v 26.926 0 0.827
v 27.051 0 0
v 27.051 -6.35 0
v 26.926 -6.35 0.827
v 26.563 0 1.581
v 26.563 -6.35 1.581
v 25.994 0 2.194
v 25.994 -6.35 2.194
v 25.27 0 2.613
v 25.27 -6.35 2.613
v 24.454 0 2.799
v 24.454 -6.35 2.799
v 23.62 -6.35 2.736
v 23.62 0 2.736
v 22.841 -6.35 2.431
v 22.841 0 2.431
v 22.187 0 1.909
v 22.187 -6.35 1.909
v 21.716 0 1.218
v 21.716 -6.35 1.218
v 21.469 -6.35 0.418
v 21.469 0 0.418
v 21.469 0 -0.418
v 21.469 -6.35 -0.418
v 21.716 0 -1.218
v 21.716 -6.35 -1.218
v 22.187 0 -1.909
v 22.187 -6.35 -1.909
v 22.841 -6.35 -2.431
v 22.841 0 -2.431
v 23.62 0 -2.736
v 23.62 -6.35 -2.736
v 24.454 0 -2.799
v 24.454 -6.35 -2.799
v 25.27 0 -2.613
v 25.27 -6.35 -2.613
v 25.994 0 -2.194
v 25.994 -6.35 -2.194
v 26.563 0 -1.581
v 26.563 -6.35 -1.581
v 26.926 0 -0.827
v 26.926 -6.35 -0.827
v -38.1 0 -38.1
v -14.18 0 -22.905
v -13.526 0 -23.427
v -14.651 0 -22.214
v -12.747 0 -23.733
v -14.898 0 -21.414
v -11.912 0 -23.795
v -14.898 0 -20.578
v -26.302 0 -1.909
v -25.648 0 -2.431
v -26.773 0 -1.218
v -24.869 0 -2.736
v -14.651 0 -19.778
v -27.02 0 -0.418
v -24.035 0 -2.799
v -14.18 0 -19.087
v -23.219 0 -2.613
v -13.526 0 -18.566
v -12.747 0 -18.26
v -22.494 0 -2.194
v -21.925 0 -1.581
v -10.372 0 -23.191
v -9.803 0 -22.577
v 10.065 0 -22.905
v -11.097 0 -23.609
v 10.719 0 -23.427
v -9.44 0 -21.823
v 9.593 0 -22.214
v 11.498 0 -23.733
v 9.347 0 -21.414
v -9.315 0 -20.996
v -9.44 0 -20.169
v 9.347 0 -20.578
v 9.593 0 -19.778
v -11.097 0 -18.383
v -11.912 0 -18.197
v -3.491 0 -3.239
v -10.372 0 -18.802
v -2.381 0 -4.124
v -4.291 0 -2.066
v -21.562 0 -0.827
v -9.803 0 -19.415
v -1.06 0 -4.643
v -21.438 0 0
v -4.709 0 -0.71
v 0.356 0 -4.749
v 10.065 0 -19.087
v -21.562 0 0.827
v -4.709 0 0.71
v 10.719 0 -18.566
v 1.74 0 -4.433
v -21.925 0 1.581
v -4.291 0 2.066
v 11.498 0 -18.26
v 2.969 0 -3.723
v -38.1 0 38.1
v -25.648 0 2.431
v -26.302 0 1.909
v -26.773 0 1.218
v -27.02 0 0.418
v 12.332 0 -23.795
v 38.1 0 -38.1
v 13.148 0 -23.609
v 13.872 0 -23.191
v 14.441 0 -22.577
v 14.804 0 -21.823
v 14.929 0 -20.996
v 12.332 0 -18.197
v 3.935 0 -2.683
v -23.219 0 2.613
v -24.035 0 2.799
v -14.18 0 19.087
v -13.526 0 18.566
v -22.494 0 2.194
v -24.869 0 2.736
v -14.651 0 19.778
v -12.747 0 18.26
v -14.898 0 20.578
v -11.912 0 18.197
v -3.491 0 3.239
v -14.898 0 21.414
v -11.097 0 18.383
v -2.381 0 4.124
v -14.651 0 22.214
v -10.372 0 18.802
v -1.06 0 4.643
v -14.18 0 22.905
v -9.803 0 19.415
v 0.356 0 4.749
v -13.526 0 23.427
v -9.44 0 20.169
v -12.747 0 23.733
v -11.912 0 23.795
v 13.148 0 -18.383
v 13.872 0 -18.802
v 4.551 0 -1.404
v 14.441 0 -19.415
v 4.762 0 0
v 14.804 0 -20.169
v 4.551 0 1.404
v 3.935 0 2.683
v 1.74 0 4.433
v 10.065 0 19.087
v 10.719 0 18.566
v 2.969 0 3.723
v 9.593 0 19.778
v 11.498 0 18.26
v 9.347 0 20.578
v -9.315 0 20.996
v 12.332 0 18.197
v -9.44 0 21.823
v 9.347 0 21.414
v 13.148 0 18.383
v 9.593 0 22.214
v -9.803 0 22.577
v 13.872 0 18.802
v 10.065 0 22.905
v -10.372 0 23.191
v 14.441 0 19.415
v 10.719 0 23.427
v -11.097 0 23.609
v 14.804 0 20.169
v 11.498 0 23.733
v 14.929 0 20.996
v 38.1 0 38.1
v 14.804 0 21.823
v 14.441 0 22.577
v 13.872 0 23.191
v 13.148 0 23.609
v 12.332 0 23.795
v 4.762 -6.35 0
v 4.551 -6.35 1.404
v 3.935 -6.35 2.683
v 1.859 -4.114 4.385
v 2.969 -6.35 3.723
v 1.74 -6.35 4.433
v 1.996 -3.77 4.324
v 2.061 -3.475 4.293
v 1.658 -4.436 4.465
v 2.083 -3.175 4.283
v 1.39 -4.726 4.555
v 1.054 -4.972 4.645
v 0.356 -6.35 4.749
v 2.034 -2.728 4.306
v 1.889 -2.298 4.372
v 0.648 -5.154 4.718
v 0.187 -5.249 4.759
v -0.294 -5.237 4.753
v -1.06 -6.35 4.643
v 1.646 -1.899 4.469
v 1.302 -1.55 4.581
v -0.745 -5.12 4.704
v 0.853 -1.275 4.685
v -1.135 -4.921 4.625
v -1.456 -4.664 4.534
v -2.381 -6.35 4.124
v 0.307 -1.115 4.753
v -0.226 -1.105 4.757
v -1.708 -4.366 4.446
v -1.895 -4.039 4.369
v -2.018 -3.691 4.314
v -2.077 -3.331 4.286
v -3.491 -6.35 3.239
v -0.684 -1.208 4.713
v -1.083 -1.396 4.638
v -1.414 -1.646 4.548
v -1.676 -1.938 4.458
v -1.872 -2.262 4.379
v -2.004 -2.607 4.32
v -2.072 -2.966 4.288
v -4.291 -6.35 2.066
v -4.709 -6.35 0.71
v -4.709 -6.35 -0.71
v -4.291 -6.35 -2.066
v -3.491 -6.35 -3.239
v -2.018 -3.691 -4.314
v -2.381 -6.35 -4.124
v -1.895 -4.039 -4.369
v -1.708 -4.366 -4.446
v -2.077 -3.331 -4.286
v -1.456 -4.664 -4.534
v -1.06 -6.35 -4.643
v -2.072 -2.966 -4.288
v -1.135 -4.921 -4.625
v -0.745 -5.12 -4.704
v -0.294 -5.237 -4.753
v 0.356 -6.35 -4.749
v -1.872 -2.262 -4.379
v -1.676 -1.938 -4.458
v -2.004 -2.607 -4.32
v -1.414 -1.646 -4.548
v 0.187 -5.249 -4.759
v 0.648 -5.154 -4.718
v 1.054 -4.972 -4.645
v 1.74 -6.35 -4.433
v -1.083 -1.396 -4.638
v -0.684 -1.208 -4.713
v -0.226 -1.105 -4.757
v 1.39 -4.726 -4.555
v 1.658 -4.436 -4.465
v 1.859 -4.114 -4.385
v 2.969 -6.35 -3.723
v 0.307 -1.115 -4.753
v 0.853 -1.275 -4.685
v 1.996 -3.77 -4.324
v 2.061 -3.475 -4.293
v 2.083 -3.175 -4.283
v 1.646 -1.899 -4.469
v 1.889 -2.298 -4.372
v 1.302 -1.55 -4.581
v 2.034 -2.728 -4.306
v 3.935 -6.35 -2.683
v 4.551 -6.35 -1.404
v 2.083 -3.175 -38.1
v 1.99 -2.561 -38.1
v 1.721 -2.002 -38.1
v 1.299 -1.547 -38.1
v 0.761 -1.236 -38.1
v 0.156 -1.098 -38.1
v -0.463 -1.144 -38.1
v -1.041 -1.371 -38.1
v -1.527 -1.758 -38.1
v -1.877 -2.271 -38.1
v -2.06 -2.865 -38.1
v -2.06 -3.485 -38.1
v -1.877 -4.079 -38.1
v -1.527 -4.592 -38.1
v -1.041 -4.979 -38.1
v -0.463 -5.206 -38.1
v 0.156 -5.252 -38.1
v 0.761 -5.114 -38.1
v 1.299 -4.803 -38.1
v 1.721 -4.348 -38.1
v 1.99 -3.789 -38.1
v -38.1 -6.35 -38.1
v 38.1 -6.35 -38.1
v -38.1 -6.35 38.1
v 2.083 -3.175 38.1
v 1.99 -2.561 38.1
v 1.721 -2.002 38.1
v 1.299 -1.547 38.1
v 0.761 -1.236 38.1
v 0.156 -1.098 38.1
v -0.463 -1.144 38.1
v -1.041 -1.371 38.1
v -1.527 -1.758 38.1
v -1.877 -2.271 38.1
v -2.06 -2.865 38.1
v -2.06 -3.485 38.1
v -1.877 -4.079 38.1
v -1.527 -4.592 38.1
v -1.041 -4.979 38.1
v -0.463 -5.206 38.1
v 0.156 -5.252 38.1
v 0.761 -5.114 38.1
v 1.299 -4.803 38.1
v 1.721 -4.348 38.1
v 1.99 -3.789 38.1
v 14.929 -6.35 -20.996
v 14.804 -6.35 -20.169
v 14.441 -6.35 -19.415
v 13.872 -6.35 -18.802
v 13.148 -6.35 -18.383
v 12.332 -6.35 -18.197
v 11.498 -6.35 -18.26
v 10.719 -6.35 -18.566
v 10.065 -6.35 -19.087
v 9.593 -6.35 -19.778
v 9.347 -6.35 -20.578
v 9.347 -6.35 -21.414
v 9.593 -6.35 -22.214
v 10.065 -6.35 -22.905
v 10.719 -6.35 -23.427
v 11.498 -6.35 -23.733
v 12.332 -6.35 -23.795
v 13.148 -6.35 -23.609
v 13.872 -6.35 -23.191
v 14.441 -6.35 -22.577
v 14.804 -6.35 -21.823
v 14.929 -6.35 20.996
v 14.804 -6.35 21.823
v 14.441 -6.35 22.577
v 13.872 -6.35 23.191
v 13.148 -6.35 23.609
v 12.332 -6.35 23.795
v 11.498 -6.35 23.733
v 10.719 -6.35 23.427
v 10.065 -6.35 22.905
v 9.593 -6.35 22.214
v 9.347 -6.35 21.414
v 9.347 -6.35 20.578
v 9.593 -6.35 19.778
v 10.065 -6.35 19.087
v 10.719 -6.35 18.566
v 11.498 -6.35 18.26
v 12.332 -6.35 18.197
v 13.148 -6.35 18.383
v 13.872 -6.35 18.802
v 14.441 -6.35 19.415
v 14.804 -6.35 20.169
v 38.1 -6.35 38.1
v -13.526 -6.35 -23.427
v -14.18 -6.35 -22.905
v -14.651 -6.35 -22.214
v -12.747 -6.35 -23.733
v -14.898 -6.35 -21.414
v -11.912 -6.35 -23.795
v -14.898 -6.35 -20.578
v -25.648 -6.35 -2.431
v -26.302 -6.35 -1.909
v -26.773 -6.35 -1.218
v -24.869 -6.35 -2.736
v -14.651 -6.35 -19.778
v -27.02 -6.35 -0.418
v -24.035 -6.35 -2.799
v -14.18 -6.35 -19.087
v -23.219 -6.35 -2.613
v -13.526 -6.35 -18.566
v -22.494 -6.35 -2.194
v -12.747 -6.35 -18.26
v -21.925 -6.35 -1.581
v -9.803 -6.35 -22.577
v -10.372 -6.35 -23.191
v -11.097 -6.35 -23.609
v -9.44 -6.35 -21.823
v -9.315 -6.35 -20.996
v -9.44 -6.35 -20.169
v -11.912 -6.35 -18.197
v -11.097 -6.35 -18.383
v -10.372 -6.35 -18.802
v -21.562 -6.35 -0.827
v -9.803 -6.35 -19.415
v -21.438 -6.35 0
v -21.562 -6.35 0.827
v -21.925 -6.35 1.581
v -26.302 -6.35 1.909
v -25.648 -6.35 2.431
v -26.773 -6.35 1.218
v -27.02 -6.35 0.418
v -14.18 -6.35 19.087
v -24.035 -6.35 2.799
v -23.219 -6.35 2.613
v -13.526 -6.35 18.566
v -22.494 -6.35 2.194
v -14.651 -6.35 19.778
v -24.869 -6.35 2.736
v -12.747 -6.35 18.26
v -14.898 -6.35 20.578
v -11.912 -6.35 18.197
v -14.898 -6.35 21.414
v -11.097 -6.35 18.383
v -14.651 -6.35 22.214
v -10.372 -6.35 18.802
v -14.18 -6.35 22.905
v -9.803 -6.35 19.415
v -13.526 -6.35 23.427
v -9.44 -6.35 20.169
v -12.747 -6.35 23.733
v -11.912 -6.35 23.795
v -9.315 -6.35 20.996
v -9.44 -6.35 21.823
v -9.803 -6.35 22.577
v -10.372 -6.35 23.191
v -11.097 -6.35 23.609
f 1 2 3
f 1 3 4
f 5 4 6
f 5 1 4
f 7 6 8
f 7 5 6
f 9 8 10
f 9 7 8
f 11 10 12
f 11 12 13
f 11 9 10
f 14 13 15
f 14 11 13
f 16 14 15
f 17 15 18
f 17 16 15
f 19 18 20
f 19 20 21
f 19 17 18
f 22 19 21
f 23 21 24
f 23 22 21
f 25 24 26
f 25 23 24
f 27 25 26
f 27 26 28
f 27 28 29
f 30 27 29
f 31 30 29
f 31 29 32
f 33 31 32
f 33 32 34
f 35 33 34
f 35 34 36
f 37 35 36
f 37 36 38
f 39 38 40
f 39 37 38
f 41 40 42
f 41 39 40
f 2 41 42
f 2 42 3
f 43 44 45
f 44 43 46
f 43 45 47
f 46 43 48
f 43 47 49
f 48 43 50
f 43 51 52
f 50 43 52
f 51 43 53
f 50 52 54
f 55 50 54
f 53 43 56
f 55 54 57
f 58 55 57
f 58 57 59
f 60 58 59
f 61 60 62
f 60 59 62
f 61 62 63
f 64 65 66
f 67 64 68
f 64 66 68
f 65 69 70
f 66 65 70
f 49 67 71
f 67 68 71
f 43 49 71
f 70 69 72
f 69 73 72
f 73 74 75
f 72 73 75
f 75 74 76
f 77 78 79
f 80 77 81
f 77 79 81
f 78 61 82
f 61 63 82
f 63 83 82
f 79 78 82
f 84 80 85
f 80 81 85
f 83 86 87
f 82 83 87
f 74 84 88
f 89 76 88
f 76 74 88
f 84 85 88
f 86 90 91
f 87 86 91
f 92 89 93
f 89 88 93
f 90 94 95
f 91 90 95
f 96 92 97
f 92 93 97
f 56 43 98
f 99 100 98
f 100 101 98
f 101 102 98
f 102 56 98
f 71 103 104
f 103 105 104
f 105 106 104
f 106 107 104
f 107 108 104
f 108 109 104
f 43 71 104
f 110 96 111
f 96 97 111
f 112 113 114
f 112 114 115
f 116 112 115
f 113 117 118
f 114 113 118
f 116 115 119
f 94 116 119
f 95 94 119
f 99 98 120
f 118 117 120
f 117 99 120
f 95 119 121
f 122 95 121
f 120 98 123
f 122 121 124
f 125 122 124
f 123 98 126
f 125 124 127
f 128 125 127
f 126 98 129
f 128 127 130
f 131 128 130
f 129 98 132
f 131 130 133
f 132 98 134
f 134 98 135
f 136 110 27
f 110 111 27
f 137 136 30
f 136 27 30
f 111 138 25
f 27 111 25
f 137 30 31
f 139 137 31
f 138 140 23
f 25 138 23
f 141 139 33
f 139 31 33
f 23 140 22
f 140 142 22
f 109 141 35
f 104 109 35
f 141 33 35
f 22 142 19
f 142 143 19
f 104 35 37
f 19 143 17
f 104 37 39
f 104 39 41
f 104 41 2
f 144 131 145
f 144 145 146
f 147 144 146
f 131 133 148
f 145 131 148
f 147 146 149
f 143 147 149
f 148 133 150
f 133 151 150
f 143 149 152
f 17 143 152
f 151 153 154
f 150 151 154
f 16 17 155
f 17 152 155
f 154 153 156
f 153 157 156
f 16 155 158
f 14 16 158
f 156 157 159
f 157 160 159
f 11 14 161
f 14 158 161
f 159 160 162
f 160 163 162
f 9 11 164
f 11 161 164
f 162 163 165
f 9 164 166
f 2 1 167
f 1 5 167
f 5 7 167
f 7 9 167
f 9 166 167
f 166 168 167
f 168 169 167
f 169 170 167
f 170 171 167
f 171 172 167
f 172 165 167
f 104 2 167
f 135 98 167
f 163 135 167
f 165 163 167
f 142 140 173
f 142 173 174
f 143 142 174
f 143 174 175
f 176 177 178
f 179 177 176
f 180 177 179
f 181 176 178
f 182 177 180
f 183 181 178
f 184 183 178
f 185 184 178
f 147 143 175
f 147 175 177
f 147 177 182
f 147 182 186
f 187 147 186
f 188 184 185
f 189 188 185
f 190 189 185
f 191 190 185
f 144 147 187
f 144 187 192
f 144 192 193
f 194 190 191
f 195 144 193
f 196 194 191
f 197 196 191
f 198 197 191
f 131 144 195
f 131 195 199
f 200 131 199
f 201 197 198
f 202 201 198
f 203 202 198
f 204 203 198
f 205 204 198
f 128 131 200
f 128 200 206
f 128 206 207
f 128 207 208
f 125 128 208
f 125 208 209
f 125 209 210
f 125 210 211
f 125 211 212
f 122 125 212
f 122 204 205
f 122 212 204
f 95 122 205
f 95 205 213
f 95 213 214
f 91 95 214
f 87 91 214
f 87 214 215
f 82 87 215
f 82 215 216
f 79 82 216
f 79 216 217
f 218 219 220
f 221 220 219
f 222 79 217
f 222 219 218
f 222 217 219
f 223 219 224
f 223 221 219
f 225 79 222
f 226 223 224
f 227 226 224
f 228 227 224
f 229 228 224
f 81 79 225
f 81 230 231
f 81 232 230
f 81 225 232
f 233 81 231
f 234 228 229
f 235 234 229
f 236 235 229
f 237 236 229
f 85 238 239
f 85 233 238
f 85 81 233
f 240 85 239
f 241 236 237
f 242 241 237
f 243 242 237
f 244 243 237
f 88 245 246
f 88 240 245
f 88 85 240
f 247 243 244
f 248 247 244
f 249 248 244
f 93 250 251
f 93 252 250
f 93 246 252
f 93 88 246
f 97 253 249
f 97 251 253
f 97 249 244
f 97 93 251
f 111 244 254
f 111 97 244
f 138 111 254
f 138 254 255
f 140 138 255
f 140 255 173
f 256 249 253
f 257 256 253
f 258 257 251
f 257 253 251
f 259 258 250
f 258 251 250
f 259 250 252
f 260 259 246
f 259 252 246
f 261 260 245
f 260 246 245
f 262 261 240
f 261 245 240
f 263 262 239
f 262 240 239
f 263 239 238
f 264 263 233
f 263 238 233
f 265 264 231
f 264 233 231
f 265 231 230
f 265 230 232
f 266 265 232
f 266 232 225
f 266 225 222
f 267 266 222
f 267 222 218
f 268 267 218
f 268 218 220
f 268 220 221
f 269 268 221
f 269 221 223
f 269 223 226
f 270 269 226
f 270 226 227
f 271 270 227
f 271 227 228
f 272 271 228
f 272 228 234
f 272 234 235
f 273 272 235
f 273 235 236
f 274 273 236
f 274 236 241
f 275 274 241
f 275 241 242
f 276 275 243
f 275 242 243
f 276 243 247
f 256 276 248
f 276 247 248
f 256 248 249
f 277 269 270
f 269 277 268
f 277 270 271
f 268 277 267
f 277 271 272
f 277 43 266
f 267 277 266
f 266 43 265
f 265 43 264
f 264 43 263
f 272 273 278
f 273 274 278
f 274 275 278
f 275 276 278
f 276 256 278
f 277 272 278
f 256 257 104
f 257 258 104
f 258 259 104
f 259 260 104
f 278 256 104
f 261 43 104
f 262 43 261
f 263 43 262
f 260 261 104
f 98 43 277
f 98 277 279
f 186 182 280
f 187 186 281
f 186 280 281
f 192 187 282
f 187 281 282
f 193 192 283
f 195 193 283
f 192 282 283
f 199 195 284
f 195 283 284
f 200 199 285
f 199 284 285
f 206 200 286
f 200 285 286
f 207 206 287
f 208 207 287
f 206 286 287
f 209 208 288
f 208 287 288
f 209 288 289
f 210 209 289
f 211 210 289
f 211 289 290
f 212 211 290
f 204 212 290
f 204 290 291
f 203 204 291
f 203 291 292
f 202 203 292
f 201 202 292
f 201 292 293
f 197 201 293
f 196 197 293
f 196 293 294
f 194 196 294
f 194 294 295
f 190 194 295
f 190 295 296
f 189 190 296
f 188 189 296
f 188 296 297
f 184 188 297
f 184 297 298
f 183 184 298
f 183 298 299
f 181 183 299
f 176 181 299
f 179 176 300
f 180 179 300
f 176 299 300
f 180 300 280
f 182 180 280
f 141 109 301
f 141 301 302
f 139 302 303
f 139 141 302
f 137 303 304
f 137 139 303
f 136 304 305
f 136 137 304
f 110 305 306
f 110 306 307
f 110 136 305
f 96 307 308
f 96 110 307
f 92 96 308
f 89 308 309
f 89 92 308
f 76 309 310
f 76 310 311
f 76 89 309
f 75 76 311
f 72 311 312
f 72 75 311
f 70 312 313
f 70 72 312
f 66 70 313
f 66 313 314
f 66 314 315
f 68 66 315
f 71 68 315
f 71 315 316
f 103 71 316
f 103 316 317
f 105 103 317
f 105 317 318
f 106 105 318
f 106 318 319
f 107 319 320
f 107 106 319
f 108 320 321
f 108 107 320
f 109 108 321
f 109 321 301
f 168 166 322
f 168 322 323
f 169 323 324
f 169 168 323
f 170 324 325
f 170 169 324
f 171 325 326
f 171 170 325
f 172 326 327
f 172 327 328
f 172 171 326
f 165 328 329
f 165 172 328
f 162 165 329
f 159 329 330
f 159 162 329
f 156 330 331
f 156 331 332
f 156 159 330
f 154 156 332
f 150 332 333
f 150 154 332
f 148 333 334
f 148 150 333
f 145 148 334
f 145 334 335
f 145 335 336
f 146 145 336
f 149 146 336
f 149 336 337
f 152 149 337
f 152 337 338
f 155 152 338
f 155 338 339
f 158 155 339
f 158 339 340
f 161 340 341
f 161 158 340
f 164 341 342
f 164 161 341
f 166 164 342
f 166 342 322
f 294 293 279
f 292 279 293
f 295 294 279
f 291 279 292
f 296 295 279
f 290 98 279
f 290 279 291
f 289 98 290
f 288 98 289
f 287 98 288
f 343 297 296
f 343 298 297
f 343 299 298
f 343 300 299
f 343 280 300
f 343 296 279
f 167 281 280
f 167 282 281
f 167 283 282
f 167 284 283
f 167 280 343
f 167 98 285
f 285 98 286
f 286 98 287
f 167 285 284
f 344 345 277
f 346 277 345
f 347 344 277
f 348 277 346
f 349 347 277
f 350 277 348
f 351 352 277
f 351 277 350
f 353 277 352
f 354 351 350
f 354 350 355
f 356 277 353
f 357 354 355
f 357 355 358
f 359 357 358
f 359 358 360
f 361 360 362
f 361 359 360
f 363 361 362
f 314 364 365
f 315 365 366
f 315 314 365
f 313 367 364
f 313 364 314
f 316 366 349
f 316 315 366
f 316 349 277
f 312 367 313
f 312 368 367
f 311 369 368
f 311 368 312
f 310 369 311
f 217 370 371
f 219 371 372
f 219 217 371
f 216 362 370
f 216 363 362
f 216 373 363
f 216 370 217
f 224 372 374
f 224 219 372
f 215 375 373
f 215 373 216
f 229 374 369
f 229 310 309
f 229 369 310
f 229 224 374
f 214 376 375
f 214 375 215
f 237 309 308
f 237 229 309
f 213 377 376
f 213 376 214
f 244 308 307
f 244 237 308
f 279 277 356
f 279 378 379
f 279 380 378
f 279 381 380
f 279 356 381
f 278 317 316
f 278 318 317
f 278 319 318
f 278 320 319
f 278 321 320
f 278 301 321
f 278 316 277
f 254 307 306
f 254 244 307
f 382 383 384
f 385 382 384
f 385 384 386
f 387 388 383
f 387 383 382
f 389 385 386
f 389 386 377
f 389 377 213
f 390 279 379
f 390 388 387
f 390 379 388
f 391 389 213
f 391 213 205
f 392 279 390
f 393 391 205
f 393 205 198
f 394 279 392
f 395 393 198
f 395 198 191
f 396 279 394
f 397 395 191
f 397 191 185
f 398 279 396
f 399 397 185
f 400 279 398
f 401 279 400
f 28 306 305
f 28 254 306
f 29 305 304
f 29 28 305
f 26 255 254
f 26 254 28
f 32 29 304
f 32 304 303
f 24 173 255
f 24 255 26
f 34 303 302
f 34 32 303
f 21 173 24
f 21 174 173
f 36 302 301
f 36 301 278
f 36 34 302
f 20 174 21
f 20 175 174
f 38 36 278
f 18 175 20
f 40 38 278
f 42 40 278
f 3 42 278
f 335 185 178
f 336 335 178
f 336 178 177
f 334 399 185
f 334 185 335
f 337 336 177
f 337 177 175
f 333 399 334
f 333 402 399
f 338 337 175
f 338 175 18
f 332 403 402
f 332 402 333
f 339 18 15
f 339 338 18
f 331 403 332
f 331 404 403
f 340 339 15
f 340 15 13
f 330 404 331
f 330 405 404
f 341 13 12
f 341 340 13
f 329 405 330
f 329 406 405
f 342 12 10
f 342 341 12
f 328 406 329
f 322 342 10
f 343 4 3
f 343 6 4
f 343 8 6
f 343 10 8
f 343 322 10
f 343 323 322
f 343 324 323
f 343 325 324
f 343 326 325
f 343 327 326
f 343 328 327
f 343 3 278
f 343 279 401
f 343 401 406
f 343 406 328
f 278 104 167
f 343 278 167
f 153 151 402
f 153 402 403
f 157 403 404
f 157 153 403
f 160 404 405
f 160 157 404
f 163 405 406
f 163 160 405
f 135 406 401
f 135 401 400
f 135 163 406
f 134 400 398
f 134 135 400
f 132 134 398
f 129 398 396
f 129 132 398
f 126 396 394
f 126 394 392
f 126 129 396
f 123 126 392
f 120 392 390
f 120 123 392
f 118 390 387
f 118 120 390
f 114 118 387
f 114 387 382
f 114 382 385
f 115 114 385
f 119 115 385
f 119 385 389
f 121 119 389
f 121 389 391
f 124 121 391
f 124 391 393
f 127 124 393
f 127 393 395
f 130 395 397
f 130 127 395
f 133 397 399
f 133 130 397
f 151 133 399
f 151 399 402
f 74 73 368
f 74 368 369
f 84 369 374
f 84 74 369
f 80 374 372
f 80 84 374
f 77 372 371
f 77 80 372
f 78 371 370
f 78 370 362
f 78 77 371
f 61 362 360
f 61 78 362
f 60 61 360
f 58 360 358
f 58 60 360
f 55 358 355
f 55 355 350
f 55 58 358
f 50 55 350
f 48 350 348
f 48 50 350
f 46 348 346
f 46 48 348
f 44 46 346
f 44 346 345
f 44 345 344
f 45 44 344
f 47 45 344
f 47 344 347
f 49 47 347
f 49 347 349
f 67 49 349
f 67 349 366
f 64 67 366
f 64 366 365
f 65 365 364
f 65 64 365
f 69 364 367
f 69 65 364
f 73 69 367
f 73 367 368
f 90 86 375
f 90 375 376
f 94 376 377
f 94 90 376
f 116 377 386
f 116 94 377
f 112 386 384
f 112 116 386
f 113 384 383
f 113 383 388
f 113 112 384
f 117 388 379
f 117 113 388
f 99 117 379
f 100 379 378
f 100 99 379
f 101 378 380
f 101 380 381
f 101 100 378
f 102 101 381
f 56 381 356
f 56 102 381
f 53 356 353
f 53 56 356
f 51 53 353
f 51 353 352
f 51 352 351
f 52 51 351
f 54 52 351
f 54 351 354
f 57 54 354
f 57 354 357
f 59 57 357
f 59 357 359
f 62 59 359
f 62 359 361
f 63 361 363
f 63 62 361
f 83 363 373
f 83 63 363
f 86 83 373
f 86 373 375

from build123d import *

# Parameters (mm, degrees)
F0_W     = 76.2
F0_H     = 76.2
F0_R     = 2.8067
F0_R_2   = 4.7625
F1_DEPTH = 6.35
F2_R     = 2.0828
F3_DEPTH = 76.201


with BuildPart() as f1:
    # F0 (on Front) → F1 (new body)
    with BuildSketch(Plane.XZ):
        Rectangle(F0_W, F0_H)
        with Locations((-12.12215, -20.99618)):
            Circle(F0_R, mode=Mode.SUBTRACT)
        with Locations((12.12215, -20.99618)):
            Circle(F0_R, mode=Mode.SUBTRACT)
        with Locations((-24.2443, 0)):
            Circle(F0_R, mode=Mode.SUBTRACT)
        with Locations((-12.12215, 20.99618)):
            Circle(F0_R, mode=Mode.SUBTRACT)
        Circle(F0_R_2, mode=Mode.SUBTRACT)
        with Locations((24.2443, 0)):
            Circle(F0_R, mode=Mode.SUBTRACT)
        with Locations((12.12215, 20.99618)):
            Circle(F0_R, mode=Mode.SUBTRACT)
    extrude(amount=F1_DEPTH)

    # F2 (on face) → F3 (cut, through all)
    with BuildSketch(Plane.XY.offset(38.1)):
        with Locations((0, -3.175)):
            Circle(F2_R)
    extrude(amount=-F3_DEPTH, mode=Mode.SUBTRACT)


solid = f1.part
